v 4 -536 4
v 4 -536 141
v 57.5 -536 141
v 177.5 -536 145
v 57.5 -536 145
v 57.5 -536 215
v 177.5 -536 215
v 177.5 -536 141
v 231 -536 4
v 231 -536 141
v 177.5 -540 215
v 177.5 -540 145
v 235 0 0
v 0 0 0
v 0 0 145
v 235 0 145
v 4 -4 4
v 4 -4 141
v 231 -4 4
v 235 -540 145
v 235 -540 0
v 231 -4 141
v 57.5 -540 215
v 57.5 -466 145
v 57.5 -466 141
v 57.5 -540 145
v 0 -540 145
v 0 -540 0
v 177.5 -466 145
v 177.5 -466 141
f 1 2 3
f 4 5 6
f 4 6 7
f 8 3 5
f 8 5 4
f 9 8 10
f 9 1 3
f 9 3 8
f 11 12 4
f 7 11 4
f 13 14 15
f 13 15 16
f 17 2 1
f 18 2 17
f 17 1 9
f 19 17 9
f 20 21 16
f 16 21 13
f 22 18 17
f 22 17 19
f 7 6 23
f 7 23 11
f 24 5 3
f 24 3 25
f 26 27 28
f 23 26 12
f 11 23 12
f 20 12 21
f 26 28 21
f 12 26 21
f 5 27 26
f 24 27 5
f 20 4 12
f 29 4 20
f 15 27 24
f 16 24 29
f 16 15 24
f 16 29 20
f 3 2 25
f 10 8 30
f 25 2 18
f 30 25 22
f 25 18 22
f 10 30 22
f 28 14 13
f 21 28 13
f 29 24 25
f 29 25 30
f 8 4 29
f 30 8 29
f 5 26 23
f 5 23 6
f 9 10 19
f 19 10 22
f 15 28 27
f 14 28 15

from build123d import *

# Parameters (mm, degrees)
ESQUISSE1_W             = 235
ESQUISSE1_H             = 540
BOSS_EXTRU_1_DEPTH      = 145
ESQUISSE2_W             = 227
ESQUISSE2_H             = 532
ENL_V_MAT_EXTRU_1_DEPTH = 141
ESQUISSE3_W             = 235
ESQUISSE3_H             = 540
BOSS_EXTRU_2_DEPTH      = 4
ESQUISSE4_W             = 120
ESQUISSE4_H             = 70
ENL_V_MAT_EXTRU_2_DEPTH = 4
ESQUISSE5_W             = 120
ESQUISSE5_H             = 4
BOSS_EXTRU_3_DEPTH      = 70


with BuildPart() as part:
    # Esquisse1 → Boss.-Extru.1 (new body)
    with BuildSketch(Plane.XY):
        with Locations((117.5, -270)):
            Rectangle(ESQUISSE1_W, ESQUISSE1_H)
    extrude(amount=BOSS_EXTRU_1_DEPTH)

    # Esquisse2 → Enlèv. mat.-Extru.1 (cut)
    with BuildSketch(Plane.XY.offset(145)):
        with Locations((117.5, -270)):
            Rectangle(ESQUISSE2_W, ESQUISSE2_H)
    extrude(amount=-ENL_V_MAT_EXTRU_1_DEPTH, mode=Mode.SUBTRACT)

    # Esquisse3 → Boss.-Extru.2 (add)
    with BuildSketch(Plane.XY.offset(145)):
        with Locations((117.5, -270)):
            Rectangle(ESQUISSE3_W, ESQUISSE3_H)
    extrude(amount=-BOSS_EXTRU_2_DEPTH)

    # Esquisse4 → Enlèv. mat.-Extru.2 (cut)
    with BuildSketch(Plane.XY.offset(145)):
        with Locations((117.5, -501)):
            Rectangle(ESQUISSE4_W, ESQUISSE4_H)
    extrude(amount=-ENL_V_MAT_EXTRU_2_DEPTH, mode=Mode.SUBTRACT)

    # Esquisse5 → Boss.-Extru.3 (add)
    with BuildSketch(Plane.XY.offset(145)):
        with Locations((117.5, -538)):
            Rectangle(ESQUISSE5_W, ESQUISSE5_H)
    extrude(amount=BOSS_EXTRU_3_DEPTH)


solid = part.part
